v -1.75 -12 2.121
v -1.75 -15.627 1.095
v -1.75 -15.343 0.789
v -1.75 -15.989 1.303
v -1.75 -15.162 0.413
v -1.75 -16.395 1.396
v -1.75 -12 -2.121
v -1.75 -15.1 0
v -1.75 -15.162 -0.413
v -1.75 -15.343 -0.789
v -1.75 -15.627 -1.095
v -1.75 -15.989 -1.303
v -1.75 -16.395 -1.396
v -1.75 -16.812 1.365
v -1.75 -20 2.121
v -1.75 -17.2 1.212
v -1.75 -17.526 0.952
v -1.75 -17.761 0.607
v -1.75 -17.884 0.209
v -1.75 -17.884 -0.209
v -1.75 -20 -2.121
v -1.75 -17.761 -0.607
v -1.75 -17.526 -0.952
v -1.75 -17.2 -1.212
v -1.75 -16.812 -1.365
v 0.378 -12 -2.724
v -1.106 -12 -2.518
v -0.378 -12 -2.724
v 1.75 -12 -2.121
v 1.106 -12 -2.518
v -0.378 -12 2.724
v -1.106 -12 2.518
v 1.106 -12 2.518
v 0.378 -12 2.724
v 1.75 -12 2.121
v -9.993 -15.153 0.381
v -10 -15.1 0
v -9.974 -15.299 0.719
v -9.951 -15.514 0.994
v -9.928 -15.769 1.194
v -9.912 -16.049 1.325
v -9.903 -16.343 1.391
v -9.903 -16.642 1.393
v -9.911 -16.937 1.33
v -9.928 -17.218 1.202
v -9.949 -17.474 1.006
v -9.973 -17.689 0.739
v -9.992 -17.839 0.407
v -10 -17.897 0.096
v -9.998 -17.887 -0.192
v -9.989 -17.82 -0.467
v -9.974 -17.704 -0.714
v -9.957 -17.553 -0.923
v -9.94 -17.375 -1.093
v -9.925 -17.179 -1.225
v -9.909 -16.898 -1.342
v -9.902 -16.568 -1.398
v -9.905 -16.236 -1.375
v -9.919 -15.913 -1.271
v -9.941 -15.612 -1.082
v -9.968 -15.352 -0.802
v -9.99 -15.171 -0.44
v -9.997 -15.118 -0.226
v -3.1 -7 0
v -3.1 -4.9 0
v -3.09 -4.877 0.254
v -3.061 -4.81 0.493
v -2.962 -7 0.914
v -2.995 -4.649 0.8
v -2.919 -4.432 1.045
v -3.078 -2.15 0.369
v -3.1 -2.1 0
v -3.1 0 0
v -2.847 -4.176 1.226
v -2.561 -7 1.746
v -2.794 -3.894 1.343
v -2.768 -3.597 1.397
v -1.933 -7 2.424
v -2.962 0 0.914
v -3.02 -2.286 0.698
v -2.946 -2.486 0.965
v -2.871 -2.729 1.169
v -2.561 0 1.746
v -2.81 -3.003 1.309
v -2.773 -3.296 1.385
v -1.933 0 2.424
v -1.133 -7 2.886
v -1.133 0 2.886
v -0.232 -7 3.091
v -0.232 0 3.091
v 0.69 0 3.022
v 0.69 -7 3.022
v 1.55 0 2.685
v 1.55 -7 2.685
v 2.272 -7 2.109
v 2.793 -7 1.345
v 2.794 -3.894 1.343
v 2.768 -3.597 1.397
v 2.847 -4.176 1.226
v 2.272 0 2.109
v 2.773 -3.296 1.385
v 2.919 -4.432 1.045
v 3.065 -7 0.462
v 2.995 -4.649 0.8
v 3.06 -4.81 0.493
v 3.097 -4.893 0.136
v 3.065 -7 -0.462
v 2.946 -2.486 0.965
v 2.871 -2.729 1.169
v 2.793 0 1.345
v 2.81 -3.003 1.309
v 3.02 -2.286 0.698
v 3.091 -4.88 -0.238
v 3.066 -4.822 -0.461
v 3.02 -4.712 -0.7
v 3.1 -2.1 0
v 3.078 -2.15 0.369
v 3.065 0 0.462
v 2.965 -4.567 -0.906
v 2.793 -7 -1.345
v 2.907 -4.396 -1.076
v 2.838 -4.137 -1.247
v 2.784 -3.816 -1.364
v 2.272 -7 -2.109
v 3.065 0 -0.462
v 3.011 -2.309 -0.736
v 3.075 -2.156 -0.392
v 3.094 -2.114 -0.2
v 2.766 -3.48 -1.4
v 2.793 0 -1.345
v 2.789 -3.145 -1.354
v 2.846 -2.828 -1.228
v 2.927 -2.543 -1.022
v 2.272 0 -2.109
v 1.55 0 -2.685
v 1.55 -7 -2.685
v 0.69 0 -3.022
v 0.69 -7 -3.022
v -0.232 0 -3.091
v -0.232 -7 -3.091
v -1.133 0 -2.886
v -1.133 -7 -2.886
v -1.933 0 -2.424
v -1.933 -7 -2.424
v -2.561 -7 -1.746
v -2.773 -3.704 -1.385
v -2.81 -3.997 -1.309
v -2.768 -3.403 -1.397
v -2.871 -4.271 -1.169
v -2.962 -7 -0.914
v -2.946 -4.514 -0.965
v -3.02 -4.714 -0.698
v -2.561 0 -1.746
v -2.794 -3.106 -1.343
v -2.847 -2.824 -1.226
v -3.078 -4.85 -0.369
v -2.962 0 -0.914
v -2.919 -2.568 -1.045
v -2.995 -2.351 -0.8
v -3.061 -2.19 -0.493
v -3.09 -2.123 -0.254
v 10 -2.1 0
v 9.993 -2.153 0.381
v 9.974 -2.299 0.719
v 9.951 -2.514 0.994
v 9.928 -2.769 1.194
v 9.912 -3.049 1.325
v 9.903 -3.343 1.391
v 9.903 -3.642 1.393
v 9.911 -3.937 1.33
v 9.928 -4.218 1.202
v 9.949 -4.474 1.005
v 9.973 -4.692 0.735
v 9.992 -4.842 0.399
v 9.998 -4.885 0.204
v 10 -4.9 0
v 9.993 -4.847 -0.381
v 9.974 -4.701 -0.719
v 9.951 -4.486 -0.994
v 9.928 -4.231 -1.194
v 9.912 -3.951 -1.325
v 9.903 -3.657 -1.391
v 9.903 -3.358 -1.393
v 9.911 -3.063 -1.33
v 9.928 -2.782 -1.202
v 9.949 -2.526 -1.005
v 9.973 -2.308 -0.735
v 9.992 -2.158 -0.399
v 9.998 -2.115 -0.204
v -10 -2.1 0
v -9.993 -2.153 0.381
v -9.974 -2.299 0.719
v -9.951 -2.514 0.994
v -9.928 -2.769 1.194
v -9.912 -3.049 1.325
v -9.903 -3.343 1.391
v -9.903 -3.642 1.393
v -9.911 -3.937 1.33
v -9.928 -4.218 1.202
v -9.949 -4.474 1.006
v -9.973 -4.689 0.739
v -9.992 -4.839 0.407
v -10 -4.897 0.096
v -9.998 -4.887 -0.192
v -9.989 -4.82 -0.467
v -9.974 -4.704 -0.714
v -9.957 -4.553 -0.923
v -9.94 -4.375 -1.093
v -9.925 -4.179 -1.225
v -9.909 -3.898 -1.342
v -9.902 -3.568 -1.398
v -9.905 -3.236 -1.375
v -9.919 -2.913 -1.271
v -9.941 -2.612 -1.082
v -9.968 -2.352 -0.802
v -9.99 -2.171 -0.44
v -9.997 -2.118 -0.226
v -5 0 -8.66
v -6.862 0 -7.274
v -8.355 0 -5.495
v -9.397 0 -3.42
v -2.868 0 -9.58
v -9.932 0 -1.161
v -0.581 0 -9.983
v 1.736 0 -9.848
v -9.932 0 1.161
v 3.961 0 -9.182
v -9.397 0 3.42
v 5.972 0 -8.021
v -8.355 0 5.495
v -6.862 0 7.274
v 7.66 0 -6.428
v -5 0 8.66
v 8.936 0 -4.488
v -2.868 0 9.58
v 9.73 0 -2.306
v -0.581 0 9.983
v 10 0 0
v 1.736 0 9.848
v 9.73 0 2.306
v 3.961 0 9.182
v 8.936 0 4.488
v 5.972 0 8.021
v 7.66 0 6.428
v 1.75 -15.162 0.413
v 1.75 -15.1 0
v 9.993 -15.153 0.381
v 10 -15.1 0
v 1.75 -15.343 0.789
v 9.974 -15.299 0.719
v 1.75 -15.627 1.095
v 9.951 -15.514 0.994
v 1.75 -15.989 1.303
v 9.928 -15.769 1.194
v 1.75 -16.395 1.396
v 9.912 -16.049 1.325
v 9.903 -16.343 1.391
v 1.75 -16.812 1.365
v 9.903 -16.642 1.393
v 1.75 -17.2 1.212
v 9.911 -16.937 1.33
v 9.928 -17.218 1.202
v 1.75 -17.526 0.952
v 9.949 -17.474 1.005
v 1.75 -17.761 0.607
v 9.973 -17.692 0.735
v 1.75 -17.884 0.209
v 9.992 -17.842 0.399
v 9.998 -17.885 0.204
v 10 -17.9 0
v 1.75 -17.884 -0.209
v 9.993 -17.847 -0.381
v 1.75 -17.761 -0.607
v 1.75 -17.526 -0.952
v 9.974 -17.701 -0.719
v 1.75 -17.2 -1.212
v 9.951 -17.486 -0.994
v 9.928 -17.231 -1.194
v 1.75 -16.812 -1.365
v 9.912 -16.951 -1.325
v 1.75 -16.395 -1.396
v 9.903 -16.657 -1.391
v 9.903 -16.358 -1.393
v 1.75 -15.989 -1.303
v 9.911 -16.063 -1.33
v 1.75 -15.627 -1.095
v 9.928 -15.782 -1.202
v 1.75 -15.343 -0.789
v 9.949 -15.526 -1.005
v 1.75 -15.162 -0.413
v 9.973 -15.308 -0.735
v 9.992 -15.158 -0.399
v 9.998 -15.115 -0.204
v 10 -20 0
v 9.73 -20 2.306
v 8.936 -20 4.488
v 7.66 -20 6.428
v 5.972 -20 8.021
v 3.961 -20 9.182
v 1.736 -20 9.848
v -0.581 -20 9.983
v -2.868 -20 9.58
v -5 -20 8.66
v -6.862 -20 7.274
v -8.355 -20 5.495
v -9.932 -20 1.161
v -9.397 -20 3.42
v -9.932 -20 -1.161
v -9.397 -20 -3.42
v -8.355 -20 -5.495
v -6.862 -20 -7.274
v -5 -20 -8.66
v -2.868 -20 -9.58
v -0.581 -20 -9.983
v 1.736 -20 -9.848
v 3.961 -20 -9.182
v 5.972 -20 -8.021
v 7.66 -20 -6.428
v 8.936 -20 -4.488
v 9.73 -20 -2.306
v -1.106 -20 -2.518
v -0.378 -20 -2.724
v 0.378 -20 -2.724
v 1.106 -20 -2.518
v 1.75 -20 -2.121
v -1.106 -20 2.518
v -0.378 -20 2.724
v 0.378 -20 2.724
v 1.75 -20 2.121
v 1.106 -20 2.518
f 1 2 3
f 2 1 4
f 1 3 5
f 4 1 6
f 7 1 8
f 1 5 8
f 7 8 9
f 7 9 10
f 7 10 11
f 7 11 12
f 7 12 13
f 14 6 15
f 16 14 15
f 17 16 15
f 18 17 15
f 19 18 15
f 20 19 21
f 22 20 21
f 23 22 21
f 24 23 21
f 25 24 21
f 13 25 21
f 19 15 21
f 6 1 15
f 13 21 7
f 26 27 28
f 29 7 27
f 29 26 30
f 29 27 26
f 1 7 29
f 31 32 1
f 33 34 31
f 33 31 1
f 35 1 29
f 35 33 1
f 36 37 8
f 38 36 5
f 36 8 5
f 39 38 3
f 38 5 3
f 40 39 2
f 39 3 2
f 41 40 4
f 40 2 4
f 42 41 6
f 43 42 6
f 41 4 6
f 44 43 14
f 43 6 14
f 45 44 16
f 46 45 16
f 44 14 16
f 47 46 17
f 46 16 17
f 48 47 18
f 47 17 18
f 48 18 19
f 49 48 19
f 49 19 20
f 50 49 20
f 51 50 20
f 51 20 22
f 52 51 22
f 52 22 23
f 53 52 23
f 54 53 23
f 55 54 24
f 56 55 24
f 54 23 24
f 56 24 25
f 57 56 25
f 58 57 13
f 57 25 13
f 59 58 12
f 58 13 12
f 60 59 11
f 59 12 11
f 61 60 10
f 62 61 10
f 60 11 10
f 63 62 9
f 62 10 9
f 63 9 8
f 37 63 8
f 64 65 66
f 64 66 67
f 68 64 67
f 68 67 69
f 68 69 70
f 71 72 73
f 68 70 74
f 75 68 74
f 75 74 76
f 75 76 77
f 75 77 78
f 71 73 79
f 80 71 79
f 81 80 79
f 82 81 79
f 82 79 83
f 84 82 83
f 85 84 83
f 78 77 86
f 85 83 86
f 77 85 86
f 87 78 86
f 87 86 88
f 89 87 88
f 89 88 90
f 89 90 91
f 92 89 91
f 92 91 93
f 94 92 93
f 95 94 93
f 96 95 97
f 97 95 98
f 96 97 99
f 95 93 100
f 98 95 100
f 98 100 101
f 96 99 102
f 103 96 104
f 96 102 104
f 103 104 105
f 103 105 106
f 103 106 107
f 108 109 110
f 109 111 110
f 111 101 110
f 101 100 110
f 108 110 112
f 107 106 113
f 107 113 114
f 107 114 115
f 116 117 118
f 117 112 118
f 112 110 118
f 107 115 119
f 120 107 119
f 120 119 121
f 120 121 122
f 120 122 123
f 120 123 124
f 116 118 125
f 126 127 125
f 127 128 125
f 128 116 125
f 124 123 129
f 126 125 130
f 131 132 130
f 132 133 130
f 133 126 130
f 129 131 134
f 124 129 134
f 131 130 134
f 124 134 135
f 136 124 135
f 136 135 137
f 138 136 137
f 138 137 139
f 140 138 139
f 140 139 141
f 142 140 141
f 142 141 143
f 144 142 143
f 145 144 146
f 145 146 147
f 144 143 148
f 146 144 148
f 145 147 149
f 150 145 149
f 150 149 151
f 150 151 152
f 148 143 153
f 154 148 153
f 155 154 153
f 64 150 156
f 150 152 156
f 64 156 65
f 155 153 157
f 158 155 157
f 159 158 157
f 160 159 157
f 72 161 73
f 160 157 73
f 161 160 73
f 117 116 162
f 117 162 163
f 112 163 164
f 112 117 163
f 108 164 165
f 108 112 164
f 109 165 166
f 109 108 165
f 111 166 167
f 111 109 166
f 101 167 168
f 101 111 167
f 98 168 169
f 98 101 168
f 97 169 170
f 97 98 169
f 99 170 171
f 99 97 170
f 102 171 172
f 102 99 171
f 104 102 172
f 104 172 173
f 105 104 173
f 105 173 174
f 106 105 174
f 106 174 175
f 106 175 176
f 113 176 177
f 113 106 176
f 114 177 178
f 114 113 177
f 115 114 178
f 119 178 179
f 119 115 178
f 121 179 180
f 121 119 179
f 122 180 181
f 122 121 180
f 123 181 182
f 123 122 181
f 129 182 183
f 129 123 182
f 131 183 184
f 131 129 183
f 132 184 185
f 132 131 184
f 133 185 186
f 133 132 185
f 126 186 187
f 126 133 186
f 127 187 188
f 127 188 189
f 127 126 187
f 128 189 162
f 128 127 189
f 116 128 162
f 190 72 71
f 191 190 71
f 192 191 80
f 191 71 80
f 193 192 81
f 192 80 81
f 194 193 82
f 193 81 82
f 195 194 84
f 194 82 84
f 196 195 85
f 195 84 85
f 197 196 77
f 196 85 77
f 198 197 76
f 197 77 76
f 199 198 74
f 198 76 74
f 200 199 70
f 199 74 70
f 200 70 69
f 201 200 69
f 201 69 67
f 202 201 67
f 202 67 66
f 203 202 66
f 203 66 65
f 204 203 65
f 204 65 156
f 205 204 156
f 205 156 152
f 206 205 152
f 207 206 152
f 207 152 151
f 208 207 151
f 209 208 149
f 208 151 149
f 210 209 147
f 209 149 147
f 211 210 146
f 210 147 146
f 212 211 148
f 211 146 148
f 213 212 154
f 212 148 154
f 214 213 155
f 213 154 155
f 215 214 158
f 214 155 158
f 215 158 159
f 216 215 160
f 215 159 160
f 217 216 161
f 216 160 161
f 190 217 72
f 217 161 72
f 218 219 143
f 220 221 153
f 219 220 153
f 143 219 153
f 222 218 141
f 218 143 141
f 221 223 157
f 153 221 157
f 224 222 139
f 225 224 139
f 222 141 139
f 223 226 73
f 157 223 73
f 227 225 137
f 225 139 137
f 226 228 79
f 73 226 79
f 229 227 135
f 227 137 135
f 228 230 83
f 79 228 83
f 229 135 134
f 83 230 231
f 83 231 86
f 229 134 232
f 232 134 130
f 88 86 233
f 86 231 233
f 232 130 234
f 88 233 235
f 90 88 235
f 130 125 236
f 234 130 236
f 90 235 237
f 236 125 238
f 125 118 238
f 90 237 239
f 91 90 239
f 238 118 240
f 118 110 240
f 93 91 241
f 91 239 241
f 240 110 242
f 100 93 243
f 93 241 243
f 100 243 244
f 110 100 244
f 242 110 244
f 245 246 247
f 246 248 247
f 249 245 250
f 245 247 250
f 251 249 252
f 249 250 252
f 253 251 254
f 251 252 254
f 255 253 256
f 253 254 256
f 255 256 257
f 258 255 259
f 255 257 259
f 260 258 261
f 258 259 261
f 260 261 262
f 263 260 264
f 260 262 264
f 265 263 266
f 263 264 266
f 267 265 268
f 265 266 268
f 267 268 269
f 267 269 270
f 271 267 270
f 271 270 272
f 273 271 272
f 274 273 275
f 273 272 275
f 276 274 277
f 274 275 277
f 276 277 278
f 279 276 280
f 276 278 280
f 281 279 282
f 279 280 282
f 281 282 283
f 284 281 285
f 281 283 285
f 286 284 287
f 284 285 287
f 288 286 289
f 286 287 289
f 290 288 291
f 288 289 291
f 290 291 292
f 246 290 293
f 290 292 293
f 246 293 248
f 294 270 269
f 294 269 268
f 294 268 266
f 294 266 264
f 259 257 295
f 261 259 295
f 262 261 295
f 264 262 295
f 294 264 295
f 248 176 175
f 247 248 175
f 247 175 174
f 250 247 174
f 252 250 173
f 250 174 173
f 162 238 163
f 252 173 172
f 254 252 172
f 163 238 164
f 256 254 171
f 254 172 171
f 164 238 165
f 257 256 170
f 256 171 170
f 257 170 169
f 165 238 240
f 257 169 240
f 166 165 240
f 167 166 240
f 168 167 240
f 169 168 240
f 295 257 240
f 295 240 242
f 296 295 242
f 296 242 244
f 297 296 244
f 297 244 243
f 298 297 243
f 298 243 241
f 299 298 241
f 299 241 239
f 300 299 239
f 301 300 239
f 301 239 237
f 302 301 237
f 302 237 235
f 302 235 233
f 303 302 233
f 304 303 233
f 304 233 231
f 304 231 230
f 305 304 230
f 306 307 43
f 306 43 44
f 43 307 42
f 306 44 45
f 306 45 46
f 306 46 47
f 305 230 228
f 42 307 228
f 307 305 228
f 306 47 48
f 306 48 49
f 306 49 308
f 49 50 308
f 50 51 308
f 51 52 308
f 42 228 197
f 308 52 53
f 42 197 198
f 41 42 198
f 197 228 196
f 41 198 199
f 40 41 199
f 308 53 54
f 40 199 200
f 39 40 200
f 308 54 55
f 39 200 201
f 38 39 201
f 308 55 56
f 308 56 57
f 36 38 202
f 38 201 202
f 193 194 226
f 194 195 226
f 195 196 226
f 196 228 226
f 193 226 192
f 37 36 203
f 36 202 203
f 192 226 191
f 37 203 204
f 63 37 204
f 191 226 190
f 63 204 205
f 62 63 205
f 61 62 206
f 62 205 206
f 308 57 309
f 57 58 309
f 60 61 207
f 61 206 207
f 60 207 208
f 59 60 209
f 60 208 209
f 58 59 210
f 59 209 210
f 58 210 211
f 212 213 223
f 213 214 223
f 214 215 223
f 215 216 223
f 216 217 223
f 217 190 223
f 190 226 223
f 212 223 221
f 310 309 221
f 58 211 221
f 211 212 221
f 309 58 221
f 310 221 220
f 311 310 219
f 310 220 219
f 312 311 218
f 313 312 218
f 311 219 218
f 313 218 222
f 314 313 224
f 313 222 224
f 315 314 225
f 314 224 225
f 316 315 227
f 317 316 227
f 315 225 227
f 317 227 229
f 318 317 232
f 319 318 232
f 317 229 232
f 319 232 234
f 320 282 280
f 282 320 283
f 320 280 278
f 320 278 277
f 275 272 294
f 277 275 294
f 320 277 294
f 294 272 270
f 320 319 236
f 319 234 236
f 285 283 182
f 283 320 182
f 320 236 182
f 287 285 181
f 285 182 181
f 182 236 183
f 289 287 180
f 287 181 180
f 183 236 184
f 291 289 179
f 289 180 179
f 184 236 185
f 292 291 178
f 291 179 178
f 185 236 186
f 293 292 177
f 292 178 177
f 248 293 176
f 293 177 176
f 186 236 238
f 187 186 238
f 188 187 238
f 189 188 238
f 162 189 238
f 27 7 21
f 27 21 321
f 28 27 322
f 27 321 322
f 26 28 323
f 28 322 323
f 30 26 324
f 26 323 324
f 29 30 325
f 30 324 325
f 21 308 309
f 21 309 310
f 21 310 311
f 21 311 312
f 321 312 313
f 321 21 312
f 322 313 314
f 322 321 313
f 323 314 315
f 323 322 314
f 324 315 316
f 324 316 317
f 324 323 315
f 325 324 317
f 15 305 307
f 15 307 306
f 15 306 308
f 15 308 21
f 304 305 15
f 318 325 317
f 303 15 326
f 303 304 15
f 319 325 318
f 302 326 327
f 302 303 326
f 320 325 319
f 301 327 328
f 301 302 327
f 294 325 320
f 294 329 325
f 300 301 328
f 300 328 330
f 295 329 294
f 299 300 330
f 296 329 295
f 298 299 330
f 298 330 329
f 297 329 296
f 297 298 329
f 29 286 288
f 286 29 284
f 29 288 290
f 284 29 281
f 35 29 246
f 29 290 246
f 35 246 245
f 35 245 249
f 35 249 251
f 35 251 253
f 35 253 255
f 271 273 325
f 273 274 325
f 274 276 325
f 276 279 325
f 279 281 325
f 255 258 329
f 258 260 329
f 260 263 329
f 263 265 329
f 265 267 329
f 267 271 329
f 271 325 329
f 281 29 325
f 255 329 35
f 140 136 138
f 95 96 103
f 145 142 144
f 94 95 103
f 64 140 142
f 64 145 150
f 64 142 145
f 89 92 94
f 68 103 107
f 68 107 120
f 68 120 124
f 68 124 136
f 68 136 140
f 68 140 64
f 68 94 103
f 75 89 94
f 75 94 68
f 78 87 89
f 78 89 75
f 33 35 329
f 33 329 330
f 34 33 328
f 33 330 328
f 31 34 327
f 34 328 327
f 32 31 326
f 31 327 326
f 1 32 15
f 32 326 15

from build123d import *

# Parameters (mm, degrees)
F0_R     = 10
F1_DEPTH = 20
F3_DEPTH = 8
F4_R     = 3.1
F5_DEPTH = 7
F6_R     = 1.4
F7_DEPTH = 12.5


with BuildPart() as f1:
    # F0 (on Front) → F1 (new body)
    with BuildSketch(Plane.XZ):
        Circle(F0_R)
    extrude(amount=F1_DEPTH)

    # F2 (on face) → F3 (cut)
    with BuildSketch(Plane.XZ.offset(20)):
        with BuildLine():
            Line((1.75, -2.12132), (1.75, 2.12132))
            ThreePointArc((1.75, 2.12132), (0, 2.75), (-1.75, 2.12132))
            Line((-1.75, 2.12132), (-1.75, -2.12132))
            ThreePointArc((-1.75, -2.12132), (0, -2.75), (1.75, -2.12132))
        make_face()
    extrude(amount=-F3_DEPTH, mode=Mode.SUBTRACT)

    # F4 (on face) → F5 (cut)
    with BuildSketch(Plane(origin=(0, 0, 0), x_dir=(-1, 0, 0), z_dir=(0, 1, 0))):
        Circle(F4_R)
    extrude(amount=-F5_DEPTH, mode=Mode.SUBTRACT)

    # F6 (on Right) → F7 (cut, symmetric)
    with BuildSketch(Plane.YZ):
        with Locations((-3.5, 0)):
            Circle(F6_R)
        with Locations((-16.5, 0)):
            Circle(F6_R)
    extrude(amount=F7_DEPTH, both=True, mode=Mode.SUBTRACT)


solid = f1.part
